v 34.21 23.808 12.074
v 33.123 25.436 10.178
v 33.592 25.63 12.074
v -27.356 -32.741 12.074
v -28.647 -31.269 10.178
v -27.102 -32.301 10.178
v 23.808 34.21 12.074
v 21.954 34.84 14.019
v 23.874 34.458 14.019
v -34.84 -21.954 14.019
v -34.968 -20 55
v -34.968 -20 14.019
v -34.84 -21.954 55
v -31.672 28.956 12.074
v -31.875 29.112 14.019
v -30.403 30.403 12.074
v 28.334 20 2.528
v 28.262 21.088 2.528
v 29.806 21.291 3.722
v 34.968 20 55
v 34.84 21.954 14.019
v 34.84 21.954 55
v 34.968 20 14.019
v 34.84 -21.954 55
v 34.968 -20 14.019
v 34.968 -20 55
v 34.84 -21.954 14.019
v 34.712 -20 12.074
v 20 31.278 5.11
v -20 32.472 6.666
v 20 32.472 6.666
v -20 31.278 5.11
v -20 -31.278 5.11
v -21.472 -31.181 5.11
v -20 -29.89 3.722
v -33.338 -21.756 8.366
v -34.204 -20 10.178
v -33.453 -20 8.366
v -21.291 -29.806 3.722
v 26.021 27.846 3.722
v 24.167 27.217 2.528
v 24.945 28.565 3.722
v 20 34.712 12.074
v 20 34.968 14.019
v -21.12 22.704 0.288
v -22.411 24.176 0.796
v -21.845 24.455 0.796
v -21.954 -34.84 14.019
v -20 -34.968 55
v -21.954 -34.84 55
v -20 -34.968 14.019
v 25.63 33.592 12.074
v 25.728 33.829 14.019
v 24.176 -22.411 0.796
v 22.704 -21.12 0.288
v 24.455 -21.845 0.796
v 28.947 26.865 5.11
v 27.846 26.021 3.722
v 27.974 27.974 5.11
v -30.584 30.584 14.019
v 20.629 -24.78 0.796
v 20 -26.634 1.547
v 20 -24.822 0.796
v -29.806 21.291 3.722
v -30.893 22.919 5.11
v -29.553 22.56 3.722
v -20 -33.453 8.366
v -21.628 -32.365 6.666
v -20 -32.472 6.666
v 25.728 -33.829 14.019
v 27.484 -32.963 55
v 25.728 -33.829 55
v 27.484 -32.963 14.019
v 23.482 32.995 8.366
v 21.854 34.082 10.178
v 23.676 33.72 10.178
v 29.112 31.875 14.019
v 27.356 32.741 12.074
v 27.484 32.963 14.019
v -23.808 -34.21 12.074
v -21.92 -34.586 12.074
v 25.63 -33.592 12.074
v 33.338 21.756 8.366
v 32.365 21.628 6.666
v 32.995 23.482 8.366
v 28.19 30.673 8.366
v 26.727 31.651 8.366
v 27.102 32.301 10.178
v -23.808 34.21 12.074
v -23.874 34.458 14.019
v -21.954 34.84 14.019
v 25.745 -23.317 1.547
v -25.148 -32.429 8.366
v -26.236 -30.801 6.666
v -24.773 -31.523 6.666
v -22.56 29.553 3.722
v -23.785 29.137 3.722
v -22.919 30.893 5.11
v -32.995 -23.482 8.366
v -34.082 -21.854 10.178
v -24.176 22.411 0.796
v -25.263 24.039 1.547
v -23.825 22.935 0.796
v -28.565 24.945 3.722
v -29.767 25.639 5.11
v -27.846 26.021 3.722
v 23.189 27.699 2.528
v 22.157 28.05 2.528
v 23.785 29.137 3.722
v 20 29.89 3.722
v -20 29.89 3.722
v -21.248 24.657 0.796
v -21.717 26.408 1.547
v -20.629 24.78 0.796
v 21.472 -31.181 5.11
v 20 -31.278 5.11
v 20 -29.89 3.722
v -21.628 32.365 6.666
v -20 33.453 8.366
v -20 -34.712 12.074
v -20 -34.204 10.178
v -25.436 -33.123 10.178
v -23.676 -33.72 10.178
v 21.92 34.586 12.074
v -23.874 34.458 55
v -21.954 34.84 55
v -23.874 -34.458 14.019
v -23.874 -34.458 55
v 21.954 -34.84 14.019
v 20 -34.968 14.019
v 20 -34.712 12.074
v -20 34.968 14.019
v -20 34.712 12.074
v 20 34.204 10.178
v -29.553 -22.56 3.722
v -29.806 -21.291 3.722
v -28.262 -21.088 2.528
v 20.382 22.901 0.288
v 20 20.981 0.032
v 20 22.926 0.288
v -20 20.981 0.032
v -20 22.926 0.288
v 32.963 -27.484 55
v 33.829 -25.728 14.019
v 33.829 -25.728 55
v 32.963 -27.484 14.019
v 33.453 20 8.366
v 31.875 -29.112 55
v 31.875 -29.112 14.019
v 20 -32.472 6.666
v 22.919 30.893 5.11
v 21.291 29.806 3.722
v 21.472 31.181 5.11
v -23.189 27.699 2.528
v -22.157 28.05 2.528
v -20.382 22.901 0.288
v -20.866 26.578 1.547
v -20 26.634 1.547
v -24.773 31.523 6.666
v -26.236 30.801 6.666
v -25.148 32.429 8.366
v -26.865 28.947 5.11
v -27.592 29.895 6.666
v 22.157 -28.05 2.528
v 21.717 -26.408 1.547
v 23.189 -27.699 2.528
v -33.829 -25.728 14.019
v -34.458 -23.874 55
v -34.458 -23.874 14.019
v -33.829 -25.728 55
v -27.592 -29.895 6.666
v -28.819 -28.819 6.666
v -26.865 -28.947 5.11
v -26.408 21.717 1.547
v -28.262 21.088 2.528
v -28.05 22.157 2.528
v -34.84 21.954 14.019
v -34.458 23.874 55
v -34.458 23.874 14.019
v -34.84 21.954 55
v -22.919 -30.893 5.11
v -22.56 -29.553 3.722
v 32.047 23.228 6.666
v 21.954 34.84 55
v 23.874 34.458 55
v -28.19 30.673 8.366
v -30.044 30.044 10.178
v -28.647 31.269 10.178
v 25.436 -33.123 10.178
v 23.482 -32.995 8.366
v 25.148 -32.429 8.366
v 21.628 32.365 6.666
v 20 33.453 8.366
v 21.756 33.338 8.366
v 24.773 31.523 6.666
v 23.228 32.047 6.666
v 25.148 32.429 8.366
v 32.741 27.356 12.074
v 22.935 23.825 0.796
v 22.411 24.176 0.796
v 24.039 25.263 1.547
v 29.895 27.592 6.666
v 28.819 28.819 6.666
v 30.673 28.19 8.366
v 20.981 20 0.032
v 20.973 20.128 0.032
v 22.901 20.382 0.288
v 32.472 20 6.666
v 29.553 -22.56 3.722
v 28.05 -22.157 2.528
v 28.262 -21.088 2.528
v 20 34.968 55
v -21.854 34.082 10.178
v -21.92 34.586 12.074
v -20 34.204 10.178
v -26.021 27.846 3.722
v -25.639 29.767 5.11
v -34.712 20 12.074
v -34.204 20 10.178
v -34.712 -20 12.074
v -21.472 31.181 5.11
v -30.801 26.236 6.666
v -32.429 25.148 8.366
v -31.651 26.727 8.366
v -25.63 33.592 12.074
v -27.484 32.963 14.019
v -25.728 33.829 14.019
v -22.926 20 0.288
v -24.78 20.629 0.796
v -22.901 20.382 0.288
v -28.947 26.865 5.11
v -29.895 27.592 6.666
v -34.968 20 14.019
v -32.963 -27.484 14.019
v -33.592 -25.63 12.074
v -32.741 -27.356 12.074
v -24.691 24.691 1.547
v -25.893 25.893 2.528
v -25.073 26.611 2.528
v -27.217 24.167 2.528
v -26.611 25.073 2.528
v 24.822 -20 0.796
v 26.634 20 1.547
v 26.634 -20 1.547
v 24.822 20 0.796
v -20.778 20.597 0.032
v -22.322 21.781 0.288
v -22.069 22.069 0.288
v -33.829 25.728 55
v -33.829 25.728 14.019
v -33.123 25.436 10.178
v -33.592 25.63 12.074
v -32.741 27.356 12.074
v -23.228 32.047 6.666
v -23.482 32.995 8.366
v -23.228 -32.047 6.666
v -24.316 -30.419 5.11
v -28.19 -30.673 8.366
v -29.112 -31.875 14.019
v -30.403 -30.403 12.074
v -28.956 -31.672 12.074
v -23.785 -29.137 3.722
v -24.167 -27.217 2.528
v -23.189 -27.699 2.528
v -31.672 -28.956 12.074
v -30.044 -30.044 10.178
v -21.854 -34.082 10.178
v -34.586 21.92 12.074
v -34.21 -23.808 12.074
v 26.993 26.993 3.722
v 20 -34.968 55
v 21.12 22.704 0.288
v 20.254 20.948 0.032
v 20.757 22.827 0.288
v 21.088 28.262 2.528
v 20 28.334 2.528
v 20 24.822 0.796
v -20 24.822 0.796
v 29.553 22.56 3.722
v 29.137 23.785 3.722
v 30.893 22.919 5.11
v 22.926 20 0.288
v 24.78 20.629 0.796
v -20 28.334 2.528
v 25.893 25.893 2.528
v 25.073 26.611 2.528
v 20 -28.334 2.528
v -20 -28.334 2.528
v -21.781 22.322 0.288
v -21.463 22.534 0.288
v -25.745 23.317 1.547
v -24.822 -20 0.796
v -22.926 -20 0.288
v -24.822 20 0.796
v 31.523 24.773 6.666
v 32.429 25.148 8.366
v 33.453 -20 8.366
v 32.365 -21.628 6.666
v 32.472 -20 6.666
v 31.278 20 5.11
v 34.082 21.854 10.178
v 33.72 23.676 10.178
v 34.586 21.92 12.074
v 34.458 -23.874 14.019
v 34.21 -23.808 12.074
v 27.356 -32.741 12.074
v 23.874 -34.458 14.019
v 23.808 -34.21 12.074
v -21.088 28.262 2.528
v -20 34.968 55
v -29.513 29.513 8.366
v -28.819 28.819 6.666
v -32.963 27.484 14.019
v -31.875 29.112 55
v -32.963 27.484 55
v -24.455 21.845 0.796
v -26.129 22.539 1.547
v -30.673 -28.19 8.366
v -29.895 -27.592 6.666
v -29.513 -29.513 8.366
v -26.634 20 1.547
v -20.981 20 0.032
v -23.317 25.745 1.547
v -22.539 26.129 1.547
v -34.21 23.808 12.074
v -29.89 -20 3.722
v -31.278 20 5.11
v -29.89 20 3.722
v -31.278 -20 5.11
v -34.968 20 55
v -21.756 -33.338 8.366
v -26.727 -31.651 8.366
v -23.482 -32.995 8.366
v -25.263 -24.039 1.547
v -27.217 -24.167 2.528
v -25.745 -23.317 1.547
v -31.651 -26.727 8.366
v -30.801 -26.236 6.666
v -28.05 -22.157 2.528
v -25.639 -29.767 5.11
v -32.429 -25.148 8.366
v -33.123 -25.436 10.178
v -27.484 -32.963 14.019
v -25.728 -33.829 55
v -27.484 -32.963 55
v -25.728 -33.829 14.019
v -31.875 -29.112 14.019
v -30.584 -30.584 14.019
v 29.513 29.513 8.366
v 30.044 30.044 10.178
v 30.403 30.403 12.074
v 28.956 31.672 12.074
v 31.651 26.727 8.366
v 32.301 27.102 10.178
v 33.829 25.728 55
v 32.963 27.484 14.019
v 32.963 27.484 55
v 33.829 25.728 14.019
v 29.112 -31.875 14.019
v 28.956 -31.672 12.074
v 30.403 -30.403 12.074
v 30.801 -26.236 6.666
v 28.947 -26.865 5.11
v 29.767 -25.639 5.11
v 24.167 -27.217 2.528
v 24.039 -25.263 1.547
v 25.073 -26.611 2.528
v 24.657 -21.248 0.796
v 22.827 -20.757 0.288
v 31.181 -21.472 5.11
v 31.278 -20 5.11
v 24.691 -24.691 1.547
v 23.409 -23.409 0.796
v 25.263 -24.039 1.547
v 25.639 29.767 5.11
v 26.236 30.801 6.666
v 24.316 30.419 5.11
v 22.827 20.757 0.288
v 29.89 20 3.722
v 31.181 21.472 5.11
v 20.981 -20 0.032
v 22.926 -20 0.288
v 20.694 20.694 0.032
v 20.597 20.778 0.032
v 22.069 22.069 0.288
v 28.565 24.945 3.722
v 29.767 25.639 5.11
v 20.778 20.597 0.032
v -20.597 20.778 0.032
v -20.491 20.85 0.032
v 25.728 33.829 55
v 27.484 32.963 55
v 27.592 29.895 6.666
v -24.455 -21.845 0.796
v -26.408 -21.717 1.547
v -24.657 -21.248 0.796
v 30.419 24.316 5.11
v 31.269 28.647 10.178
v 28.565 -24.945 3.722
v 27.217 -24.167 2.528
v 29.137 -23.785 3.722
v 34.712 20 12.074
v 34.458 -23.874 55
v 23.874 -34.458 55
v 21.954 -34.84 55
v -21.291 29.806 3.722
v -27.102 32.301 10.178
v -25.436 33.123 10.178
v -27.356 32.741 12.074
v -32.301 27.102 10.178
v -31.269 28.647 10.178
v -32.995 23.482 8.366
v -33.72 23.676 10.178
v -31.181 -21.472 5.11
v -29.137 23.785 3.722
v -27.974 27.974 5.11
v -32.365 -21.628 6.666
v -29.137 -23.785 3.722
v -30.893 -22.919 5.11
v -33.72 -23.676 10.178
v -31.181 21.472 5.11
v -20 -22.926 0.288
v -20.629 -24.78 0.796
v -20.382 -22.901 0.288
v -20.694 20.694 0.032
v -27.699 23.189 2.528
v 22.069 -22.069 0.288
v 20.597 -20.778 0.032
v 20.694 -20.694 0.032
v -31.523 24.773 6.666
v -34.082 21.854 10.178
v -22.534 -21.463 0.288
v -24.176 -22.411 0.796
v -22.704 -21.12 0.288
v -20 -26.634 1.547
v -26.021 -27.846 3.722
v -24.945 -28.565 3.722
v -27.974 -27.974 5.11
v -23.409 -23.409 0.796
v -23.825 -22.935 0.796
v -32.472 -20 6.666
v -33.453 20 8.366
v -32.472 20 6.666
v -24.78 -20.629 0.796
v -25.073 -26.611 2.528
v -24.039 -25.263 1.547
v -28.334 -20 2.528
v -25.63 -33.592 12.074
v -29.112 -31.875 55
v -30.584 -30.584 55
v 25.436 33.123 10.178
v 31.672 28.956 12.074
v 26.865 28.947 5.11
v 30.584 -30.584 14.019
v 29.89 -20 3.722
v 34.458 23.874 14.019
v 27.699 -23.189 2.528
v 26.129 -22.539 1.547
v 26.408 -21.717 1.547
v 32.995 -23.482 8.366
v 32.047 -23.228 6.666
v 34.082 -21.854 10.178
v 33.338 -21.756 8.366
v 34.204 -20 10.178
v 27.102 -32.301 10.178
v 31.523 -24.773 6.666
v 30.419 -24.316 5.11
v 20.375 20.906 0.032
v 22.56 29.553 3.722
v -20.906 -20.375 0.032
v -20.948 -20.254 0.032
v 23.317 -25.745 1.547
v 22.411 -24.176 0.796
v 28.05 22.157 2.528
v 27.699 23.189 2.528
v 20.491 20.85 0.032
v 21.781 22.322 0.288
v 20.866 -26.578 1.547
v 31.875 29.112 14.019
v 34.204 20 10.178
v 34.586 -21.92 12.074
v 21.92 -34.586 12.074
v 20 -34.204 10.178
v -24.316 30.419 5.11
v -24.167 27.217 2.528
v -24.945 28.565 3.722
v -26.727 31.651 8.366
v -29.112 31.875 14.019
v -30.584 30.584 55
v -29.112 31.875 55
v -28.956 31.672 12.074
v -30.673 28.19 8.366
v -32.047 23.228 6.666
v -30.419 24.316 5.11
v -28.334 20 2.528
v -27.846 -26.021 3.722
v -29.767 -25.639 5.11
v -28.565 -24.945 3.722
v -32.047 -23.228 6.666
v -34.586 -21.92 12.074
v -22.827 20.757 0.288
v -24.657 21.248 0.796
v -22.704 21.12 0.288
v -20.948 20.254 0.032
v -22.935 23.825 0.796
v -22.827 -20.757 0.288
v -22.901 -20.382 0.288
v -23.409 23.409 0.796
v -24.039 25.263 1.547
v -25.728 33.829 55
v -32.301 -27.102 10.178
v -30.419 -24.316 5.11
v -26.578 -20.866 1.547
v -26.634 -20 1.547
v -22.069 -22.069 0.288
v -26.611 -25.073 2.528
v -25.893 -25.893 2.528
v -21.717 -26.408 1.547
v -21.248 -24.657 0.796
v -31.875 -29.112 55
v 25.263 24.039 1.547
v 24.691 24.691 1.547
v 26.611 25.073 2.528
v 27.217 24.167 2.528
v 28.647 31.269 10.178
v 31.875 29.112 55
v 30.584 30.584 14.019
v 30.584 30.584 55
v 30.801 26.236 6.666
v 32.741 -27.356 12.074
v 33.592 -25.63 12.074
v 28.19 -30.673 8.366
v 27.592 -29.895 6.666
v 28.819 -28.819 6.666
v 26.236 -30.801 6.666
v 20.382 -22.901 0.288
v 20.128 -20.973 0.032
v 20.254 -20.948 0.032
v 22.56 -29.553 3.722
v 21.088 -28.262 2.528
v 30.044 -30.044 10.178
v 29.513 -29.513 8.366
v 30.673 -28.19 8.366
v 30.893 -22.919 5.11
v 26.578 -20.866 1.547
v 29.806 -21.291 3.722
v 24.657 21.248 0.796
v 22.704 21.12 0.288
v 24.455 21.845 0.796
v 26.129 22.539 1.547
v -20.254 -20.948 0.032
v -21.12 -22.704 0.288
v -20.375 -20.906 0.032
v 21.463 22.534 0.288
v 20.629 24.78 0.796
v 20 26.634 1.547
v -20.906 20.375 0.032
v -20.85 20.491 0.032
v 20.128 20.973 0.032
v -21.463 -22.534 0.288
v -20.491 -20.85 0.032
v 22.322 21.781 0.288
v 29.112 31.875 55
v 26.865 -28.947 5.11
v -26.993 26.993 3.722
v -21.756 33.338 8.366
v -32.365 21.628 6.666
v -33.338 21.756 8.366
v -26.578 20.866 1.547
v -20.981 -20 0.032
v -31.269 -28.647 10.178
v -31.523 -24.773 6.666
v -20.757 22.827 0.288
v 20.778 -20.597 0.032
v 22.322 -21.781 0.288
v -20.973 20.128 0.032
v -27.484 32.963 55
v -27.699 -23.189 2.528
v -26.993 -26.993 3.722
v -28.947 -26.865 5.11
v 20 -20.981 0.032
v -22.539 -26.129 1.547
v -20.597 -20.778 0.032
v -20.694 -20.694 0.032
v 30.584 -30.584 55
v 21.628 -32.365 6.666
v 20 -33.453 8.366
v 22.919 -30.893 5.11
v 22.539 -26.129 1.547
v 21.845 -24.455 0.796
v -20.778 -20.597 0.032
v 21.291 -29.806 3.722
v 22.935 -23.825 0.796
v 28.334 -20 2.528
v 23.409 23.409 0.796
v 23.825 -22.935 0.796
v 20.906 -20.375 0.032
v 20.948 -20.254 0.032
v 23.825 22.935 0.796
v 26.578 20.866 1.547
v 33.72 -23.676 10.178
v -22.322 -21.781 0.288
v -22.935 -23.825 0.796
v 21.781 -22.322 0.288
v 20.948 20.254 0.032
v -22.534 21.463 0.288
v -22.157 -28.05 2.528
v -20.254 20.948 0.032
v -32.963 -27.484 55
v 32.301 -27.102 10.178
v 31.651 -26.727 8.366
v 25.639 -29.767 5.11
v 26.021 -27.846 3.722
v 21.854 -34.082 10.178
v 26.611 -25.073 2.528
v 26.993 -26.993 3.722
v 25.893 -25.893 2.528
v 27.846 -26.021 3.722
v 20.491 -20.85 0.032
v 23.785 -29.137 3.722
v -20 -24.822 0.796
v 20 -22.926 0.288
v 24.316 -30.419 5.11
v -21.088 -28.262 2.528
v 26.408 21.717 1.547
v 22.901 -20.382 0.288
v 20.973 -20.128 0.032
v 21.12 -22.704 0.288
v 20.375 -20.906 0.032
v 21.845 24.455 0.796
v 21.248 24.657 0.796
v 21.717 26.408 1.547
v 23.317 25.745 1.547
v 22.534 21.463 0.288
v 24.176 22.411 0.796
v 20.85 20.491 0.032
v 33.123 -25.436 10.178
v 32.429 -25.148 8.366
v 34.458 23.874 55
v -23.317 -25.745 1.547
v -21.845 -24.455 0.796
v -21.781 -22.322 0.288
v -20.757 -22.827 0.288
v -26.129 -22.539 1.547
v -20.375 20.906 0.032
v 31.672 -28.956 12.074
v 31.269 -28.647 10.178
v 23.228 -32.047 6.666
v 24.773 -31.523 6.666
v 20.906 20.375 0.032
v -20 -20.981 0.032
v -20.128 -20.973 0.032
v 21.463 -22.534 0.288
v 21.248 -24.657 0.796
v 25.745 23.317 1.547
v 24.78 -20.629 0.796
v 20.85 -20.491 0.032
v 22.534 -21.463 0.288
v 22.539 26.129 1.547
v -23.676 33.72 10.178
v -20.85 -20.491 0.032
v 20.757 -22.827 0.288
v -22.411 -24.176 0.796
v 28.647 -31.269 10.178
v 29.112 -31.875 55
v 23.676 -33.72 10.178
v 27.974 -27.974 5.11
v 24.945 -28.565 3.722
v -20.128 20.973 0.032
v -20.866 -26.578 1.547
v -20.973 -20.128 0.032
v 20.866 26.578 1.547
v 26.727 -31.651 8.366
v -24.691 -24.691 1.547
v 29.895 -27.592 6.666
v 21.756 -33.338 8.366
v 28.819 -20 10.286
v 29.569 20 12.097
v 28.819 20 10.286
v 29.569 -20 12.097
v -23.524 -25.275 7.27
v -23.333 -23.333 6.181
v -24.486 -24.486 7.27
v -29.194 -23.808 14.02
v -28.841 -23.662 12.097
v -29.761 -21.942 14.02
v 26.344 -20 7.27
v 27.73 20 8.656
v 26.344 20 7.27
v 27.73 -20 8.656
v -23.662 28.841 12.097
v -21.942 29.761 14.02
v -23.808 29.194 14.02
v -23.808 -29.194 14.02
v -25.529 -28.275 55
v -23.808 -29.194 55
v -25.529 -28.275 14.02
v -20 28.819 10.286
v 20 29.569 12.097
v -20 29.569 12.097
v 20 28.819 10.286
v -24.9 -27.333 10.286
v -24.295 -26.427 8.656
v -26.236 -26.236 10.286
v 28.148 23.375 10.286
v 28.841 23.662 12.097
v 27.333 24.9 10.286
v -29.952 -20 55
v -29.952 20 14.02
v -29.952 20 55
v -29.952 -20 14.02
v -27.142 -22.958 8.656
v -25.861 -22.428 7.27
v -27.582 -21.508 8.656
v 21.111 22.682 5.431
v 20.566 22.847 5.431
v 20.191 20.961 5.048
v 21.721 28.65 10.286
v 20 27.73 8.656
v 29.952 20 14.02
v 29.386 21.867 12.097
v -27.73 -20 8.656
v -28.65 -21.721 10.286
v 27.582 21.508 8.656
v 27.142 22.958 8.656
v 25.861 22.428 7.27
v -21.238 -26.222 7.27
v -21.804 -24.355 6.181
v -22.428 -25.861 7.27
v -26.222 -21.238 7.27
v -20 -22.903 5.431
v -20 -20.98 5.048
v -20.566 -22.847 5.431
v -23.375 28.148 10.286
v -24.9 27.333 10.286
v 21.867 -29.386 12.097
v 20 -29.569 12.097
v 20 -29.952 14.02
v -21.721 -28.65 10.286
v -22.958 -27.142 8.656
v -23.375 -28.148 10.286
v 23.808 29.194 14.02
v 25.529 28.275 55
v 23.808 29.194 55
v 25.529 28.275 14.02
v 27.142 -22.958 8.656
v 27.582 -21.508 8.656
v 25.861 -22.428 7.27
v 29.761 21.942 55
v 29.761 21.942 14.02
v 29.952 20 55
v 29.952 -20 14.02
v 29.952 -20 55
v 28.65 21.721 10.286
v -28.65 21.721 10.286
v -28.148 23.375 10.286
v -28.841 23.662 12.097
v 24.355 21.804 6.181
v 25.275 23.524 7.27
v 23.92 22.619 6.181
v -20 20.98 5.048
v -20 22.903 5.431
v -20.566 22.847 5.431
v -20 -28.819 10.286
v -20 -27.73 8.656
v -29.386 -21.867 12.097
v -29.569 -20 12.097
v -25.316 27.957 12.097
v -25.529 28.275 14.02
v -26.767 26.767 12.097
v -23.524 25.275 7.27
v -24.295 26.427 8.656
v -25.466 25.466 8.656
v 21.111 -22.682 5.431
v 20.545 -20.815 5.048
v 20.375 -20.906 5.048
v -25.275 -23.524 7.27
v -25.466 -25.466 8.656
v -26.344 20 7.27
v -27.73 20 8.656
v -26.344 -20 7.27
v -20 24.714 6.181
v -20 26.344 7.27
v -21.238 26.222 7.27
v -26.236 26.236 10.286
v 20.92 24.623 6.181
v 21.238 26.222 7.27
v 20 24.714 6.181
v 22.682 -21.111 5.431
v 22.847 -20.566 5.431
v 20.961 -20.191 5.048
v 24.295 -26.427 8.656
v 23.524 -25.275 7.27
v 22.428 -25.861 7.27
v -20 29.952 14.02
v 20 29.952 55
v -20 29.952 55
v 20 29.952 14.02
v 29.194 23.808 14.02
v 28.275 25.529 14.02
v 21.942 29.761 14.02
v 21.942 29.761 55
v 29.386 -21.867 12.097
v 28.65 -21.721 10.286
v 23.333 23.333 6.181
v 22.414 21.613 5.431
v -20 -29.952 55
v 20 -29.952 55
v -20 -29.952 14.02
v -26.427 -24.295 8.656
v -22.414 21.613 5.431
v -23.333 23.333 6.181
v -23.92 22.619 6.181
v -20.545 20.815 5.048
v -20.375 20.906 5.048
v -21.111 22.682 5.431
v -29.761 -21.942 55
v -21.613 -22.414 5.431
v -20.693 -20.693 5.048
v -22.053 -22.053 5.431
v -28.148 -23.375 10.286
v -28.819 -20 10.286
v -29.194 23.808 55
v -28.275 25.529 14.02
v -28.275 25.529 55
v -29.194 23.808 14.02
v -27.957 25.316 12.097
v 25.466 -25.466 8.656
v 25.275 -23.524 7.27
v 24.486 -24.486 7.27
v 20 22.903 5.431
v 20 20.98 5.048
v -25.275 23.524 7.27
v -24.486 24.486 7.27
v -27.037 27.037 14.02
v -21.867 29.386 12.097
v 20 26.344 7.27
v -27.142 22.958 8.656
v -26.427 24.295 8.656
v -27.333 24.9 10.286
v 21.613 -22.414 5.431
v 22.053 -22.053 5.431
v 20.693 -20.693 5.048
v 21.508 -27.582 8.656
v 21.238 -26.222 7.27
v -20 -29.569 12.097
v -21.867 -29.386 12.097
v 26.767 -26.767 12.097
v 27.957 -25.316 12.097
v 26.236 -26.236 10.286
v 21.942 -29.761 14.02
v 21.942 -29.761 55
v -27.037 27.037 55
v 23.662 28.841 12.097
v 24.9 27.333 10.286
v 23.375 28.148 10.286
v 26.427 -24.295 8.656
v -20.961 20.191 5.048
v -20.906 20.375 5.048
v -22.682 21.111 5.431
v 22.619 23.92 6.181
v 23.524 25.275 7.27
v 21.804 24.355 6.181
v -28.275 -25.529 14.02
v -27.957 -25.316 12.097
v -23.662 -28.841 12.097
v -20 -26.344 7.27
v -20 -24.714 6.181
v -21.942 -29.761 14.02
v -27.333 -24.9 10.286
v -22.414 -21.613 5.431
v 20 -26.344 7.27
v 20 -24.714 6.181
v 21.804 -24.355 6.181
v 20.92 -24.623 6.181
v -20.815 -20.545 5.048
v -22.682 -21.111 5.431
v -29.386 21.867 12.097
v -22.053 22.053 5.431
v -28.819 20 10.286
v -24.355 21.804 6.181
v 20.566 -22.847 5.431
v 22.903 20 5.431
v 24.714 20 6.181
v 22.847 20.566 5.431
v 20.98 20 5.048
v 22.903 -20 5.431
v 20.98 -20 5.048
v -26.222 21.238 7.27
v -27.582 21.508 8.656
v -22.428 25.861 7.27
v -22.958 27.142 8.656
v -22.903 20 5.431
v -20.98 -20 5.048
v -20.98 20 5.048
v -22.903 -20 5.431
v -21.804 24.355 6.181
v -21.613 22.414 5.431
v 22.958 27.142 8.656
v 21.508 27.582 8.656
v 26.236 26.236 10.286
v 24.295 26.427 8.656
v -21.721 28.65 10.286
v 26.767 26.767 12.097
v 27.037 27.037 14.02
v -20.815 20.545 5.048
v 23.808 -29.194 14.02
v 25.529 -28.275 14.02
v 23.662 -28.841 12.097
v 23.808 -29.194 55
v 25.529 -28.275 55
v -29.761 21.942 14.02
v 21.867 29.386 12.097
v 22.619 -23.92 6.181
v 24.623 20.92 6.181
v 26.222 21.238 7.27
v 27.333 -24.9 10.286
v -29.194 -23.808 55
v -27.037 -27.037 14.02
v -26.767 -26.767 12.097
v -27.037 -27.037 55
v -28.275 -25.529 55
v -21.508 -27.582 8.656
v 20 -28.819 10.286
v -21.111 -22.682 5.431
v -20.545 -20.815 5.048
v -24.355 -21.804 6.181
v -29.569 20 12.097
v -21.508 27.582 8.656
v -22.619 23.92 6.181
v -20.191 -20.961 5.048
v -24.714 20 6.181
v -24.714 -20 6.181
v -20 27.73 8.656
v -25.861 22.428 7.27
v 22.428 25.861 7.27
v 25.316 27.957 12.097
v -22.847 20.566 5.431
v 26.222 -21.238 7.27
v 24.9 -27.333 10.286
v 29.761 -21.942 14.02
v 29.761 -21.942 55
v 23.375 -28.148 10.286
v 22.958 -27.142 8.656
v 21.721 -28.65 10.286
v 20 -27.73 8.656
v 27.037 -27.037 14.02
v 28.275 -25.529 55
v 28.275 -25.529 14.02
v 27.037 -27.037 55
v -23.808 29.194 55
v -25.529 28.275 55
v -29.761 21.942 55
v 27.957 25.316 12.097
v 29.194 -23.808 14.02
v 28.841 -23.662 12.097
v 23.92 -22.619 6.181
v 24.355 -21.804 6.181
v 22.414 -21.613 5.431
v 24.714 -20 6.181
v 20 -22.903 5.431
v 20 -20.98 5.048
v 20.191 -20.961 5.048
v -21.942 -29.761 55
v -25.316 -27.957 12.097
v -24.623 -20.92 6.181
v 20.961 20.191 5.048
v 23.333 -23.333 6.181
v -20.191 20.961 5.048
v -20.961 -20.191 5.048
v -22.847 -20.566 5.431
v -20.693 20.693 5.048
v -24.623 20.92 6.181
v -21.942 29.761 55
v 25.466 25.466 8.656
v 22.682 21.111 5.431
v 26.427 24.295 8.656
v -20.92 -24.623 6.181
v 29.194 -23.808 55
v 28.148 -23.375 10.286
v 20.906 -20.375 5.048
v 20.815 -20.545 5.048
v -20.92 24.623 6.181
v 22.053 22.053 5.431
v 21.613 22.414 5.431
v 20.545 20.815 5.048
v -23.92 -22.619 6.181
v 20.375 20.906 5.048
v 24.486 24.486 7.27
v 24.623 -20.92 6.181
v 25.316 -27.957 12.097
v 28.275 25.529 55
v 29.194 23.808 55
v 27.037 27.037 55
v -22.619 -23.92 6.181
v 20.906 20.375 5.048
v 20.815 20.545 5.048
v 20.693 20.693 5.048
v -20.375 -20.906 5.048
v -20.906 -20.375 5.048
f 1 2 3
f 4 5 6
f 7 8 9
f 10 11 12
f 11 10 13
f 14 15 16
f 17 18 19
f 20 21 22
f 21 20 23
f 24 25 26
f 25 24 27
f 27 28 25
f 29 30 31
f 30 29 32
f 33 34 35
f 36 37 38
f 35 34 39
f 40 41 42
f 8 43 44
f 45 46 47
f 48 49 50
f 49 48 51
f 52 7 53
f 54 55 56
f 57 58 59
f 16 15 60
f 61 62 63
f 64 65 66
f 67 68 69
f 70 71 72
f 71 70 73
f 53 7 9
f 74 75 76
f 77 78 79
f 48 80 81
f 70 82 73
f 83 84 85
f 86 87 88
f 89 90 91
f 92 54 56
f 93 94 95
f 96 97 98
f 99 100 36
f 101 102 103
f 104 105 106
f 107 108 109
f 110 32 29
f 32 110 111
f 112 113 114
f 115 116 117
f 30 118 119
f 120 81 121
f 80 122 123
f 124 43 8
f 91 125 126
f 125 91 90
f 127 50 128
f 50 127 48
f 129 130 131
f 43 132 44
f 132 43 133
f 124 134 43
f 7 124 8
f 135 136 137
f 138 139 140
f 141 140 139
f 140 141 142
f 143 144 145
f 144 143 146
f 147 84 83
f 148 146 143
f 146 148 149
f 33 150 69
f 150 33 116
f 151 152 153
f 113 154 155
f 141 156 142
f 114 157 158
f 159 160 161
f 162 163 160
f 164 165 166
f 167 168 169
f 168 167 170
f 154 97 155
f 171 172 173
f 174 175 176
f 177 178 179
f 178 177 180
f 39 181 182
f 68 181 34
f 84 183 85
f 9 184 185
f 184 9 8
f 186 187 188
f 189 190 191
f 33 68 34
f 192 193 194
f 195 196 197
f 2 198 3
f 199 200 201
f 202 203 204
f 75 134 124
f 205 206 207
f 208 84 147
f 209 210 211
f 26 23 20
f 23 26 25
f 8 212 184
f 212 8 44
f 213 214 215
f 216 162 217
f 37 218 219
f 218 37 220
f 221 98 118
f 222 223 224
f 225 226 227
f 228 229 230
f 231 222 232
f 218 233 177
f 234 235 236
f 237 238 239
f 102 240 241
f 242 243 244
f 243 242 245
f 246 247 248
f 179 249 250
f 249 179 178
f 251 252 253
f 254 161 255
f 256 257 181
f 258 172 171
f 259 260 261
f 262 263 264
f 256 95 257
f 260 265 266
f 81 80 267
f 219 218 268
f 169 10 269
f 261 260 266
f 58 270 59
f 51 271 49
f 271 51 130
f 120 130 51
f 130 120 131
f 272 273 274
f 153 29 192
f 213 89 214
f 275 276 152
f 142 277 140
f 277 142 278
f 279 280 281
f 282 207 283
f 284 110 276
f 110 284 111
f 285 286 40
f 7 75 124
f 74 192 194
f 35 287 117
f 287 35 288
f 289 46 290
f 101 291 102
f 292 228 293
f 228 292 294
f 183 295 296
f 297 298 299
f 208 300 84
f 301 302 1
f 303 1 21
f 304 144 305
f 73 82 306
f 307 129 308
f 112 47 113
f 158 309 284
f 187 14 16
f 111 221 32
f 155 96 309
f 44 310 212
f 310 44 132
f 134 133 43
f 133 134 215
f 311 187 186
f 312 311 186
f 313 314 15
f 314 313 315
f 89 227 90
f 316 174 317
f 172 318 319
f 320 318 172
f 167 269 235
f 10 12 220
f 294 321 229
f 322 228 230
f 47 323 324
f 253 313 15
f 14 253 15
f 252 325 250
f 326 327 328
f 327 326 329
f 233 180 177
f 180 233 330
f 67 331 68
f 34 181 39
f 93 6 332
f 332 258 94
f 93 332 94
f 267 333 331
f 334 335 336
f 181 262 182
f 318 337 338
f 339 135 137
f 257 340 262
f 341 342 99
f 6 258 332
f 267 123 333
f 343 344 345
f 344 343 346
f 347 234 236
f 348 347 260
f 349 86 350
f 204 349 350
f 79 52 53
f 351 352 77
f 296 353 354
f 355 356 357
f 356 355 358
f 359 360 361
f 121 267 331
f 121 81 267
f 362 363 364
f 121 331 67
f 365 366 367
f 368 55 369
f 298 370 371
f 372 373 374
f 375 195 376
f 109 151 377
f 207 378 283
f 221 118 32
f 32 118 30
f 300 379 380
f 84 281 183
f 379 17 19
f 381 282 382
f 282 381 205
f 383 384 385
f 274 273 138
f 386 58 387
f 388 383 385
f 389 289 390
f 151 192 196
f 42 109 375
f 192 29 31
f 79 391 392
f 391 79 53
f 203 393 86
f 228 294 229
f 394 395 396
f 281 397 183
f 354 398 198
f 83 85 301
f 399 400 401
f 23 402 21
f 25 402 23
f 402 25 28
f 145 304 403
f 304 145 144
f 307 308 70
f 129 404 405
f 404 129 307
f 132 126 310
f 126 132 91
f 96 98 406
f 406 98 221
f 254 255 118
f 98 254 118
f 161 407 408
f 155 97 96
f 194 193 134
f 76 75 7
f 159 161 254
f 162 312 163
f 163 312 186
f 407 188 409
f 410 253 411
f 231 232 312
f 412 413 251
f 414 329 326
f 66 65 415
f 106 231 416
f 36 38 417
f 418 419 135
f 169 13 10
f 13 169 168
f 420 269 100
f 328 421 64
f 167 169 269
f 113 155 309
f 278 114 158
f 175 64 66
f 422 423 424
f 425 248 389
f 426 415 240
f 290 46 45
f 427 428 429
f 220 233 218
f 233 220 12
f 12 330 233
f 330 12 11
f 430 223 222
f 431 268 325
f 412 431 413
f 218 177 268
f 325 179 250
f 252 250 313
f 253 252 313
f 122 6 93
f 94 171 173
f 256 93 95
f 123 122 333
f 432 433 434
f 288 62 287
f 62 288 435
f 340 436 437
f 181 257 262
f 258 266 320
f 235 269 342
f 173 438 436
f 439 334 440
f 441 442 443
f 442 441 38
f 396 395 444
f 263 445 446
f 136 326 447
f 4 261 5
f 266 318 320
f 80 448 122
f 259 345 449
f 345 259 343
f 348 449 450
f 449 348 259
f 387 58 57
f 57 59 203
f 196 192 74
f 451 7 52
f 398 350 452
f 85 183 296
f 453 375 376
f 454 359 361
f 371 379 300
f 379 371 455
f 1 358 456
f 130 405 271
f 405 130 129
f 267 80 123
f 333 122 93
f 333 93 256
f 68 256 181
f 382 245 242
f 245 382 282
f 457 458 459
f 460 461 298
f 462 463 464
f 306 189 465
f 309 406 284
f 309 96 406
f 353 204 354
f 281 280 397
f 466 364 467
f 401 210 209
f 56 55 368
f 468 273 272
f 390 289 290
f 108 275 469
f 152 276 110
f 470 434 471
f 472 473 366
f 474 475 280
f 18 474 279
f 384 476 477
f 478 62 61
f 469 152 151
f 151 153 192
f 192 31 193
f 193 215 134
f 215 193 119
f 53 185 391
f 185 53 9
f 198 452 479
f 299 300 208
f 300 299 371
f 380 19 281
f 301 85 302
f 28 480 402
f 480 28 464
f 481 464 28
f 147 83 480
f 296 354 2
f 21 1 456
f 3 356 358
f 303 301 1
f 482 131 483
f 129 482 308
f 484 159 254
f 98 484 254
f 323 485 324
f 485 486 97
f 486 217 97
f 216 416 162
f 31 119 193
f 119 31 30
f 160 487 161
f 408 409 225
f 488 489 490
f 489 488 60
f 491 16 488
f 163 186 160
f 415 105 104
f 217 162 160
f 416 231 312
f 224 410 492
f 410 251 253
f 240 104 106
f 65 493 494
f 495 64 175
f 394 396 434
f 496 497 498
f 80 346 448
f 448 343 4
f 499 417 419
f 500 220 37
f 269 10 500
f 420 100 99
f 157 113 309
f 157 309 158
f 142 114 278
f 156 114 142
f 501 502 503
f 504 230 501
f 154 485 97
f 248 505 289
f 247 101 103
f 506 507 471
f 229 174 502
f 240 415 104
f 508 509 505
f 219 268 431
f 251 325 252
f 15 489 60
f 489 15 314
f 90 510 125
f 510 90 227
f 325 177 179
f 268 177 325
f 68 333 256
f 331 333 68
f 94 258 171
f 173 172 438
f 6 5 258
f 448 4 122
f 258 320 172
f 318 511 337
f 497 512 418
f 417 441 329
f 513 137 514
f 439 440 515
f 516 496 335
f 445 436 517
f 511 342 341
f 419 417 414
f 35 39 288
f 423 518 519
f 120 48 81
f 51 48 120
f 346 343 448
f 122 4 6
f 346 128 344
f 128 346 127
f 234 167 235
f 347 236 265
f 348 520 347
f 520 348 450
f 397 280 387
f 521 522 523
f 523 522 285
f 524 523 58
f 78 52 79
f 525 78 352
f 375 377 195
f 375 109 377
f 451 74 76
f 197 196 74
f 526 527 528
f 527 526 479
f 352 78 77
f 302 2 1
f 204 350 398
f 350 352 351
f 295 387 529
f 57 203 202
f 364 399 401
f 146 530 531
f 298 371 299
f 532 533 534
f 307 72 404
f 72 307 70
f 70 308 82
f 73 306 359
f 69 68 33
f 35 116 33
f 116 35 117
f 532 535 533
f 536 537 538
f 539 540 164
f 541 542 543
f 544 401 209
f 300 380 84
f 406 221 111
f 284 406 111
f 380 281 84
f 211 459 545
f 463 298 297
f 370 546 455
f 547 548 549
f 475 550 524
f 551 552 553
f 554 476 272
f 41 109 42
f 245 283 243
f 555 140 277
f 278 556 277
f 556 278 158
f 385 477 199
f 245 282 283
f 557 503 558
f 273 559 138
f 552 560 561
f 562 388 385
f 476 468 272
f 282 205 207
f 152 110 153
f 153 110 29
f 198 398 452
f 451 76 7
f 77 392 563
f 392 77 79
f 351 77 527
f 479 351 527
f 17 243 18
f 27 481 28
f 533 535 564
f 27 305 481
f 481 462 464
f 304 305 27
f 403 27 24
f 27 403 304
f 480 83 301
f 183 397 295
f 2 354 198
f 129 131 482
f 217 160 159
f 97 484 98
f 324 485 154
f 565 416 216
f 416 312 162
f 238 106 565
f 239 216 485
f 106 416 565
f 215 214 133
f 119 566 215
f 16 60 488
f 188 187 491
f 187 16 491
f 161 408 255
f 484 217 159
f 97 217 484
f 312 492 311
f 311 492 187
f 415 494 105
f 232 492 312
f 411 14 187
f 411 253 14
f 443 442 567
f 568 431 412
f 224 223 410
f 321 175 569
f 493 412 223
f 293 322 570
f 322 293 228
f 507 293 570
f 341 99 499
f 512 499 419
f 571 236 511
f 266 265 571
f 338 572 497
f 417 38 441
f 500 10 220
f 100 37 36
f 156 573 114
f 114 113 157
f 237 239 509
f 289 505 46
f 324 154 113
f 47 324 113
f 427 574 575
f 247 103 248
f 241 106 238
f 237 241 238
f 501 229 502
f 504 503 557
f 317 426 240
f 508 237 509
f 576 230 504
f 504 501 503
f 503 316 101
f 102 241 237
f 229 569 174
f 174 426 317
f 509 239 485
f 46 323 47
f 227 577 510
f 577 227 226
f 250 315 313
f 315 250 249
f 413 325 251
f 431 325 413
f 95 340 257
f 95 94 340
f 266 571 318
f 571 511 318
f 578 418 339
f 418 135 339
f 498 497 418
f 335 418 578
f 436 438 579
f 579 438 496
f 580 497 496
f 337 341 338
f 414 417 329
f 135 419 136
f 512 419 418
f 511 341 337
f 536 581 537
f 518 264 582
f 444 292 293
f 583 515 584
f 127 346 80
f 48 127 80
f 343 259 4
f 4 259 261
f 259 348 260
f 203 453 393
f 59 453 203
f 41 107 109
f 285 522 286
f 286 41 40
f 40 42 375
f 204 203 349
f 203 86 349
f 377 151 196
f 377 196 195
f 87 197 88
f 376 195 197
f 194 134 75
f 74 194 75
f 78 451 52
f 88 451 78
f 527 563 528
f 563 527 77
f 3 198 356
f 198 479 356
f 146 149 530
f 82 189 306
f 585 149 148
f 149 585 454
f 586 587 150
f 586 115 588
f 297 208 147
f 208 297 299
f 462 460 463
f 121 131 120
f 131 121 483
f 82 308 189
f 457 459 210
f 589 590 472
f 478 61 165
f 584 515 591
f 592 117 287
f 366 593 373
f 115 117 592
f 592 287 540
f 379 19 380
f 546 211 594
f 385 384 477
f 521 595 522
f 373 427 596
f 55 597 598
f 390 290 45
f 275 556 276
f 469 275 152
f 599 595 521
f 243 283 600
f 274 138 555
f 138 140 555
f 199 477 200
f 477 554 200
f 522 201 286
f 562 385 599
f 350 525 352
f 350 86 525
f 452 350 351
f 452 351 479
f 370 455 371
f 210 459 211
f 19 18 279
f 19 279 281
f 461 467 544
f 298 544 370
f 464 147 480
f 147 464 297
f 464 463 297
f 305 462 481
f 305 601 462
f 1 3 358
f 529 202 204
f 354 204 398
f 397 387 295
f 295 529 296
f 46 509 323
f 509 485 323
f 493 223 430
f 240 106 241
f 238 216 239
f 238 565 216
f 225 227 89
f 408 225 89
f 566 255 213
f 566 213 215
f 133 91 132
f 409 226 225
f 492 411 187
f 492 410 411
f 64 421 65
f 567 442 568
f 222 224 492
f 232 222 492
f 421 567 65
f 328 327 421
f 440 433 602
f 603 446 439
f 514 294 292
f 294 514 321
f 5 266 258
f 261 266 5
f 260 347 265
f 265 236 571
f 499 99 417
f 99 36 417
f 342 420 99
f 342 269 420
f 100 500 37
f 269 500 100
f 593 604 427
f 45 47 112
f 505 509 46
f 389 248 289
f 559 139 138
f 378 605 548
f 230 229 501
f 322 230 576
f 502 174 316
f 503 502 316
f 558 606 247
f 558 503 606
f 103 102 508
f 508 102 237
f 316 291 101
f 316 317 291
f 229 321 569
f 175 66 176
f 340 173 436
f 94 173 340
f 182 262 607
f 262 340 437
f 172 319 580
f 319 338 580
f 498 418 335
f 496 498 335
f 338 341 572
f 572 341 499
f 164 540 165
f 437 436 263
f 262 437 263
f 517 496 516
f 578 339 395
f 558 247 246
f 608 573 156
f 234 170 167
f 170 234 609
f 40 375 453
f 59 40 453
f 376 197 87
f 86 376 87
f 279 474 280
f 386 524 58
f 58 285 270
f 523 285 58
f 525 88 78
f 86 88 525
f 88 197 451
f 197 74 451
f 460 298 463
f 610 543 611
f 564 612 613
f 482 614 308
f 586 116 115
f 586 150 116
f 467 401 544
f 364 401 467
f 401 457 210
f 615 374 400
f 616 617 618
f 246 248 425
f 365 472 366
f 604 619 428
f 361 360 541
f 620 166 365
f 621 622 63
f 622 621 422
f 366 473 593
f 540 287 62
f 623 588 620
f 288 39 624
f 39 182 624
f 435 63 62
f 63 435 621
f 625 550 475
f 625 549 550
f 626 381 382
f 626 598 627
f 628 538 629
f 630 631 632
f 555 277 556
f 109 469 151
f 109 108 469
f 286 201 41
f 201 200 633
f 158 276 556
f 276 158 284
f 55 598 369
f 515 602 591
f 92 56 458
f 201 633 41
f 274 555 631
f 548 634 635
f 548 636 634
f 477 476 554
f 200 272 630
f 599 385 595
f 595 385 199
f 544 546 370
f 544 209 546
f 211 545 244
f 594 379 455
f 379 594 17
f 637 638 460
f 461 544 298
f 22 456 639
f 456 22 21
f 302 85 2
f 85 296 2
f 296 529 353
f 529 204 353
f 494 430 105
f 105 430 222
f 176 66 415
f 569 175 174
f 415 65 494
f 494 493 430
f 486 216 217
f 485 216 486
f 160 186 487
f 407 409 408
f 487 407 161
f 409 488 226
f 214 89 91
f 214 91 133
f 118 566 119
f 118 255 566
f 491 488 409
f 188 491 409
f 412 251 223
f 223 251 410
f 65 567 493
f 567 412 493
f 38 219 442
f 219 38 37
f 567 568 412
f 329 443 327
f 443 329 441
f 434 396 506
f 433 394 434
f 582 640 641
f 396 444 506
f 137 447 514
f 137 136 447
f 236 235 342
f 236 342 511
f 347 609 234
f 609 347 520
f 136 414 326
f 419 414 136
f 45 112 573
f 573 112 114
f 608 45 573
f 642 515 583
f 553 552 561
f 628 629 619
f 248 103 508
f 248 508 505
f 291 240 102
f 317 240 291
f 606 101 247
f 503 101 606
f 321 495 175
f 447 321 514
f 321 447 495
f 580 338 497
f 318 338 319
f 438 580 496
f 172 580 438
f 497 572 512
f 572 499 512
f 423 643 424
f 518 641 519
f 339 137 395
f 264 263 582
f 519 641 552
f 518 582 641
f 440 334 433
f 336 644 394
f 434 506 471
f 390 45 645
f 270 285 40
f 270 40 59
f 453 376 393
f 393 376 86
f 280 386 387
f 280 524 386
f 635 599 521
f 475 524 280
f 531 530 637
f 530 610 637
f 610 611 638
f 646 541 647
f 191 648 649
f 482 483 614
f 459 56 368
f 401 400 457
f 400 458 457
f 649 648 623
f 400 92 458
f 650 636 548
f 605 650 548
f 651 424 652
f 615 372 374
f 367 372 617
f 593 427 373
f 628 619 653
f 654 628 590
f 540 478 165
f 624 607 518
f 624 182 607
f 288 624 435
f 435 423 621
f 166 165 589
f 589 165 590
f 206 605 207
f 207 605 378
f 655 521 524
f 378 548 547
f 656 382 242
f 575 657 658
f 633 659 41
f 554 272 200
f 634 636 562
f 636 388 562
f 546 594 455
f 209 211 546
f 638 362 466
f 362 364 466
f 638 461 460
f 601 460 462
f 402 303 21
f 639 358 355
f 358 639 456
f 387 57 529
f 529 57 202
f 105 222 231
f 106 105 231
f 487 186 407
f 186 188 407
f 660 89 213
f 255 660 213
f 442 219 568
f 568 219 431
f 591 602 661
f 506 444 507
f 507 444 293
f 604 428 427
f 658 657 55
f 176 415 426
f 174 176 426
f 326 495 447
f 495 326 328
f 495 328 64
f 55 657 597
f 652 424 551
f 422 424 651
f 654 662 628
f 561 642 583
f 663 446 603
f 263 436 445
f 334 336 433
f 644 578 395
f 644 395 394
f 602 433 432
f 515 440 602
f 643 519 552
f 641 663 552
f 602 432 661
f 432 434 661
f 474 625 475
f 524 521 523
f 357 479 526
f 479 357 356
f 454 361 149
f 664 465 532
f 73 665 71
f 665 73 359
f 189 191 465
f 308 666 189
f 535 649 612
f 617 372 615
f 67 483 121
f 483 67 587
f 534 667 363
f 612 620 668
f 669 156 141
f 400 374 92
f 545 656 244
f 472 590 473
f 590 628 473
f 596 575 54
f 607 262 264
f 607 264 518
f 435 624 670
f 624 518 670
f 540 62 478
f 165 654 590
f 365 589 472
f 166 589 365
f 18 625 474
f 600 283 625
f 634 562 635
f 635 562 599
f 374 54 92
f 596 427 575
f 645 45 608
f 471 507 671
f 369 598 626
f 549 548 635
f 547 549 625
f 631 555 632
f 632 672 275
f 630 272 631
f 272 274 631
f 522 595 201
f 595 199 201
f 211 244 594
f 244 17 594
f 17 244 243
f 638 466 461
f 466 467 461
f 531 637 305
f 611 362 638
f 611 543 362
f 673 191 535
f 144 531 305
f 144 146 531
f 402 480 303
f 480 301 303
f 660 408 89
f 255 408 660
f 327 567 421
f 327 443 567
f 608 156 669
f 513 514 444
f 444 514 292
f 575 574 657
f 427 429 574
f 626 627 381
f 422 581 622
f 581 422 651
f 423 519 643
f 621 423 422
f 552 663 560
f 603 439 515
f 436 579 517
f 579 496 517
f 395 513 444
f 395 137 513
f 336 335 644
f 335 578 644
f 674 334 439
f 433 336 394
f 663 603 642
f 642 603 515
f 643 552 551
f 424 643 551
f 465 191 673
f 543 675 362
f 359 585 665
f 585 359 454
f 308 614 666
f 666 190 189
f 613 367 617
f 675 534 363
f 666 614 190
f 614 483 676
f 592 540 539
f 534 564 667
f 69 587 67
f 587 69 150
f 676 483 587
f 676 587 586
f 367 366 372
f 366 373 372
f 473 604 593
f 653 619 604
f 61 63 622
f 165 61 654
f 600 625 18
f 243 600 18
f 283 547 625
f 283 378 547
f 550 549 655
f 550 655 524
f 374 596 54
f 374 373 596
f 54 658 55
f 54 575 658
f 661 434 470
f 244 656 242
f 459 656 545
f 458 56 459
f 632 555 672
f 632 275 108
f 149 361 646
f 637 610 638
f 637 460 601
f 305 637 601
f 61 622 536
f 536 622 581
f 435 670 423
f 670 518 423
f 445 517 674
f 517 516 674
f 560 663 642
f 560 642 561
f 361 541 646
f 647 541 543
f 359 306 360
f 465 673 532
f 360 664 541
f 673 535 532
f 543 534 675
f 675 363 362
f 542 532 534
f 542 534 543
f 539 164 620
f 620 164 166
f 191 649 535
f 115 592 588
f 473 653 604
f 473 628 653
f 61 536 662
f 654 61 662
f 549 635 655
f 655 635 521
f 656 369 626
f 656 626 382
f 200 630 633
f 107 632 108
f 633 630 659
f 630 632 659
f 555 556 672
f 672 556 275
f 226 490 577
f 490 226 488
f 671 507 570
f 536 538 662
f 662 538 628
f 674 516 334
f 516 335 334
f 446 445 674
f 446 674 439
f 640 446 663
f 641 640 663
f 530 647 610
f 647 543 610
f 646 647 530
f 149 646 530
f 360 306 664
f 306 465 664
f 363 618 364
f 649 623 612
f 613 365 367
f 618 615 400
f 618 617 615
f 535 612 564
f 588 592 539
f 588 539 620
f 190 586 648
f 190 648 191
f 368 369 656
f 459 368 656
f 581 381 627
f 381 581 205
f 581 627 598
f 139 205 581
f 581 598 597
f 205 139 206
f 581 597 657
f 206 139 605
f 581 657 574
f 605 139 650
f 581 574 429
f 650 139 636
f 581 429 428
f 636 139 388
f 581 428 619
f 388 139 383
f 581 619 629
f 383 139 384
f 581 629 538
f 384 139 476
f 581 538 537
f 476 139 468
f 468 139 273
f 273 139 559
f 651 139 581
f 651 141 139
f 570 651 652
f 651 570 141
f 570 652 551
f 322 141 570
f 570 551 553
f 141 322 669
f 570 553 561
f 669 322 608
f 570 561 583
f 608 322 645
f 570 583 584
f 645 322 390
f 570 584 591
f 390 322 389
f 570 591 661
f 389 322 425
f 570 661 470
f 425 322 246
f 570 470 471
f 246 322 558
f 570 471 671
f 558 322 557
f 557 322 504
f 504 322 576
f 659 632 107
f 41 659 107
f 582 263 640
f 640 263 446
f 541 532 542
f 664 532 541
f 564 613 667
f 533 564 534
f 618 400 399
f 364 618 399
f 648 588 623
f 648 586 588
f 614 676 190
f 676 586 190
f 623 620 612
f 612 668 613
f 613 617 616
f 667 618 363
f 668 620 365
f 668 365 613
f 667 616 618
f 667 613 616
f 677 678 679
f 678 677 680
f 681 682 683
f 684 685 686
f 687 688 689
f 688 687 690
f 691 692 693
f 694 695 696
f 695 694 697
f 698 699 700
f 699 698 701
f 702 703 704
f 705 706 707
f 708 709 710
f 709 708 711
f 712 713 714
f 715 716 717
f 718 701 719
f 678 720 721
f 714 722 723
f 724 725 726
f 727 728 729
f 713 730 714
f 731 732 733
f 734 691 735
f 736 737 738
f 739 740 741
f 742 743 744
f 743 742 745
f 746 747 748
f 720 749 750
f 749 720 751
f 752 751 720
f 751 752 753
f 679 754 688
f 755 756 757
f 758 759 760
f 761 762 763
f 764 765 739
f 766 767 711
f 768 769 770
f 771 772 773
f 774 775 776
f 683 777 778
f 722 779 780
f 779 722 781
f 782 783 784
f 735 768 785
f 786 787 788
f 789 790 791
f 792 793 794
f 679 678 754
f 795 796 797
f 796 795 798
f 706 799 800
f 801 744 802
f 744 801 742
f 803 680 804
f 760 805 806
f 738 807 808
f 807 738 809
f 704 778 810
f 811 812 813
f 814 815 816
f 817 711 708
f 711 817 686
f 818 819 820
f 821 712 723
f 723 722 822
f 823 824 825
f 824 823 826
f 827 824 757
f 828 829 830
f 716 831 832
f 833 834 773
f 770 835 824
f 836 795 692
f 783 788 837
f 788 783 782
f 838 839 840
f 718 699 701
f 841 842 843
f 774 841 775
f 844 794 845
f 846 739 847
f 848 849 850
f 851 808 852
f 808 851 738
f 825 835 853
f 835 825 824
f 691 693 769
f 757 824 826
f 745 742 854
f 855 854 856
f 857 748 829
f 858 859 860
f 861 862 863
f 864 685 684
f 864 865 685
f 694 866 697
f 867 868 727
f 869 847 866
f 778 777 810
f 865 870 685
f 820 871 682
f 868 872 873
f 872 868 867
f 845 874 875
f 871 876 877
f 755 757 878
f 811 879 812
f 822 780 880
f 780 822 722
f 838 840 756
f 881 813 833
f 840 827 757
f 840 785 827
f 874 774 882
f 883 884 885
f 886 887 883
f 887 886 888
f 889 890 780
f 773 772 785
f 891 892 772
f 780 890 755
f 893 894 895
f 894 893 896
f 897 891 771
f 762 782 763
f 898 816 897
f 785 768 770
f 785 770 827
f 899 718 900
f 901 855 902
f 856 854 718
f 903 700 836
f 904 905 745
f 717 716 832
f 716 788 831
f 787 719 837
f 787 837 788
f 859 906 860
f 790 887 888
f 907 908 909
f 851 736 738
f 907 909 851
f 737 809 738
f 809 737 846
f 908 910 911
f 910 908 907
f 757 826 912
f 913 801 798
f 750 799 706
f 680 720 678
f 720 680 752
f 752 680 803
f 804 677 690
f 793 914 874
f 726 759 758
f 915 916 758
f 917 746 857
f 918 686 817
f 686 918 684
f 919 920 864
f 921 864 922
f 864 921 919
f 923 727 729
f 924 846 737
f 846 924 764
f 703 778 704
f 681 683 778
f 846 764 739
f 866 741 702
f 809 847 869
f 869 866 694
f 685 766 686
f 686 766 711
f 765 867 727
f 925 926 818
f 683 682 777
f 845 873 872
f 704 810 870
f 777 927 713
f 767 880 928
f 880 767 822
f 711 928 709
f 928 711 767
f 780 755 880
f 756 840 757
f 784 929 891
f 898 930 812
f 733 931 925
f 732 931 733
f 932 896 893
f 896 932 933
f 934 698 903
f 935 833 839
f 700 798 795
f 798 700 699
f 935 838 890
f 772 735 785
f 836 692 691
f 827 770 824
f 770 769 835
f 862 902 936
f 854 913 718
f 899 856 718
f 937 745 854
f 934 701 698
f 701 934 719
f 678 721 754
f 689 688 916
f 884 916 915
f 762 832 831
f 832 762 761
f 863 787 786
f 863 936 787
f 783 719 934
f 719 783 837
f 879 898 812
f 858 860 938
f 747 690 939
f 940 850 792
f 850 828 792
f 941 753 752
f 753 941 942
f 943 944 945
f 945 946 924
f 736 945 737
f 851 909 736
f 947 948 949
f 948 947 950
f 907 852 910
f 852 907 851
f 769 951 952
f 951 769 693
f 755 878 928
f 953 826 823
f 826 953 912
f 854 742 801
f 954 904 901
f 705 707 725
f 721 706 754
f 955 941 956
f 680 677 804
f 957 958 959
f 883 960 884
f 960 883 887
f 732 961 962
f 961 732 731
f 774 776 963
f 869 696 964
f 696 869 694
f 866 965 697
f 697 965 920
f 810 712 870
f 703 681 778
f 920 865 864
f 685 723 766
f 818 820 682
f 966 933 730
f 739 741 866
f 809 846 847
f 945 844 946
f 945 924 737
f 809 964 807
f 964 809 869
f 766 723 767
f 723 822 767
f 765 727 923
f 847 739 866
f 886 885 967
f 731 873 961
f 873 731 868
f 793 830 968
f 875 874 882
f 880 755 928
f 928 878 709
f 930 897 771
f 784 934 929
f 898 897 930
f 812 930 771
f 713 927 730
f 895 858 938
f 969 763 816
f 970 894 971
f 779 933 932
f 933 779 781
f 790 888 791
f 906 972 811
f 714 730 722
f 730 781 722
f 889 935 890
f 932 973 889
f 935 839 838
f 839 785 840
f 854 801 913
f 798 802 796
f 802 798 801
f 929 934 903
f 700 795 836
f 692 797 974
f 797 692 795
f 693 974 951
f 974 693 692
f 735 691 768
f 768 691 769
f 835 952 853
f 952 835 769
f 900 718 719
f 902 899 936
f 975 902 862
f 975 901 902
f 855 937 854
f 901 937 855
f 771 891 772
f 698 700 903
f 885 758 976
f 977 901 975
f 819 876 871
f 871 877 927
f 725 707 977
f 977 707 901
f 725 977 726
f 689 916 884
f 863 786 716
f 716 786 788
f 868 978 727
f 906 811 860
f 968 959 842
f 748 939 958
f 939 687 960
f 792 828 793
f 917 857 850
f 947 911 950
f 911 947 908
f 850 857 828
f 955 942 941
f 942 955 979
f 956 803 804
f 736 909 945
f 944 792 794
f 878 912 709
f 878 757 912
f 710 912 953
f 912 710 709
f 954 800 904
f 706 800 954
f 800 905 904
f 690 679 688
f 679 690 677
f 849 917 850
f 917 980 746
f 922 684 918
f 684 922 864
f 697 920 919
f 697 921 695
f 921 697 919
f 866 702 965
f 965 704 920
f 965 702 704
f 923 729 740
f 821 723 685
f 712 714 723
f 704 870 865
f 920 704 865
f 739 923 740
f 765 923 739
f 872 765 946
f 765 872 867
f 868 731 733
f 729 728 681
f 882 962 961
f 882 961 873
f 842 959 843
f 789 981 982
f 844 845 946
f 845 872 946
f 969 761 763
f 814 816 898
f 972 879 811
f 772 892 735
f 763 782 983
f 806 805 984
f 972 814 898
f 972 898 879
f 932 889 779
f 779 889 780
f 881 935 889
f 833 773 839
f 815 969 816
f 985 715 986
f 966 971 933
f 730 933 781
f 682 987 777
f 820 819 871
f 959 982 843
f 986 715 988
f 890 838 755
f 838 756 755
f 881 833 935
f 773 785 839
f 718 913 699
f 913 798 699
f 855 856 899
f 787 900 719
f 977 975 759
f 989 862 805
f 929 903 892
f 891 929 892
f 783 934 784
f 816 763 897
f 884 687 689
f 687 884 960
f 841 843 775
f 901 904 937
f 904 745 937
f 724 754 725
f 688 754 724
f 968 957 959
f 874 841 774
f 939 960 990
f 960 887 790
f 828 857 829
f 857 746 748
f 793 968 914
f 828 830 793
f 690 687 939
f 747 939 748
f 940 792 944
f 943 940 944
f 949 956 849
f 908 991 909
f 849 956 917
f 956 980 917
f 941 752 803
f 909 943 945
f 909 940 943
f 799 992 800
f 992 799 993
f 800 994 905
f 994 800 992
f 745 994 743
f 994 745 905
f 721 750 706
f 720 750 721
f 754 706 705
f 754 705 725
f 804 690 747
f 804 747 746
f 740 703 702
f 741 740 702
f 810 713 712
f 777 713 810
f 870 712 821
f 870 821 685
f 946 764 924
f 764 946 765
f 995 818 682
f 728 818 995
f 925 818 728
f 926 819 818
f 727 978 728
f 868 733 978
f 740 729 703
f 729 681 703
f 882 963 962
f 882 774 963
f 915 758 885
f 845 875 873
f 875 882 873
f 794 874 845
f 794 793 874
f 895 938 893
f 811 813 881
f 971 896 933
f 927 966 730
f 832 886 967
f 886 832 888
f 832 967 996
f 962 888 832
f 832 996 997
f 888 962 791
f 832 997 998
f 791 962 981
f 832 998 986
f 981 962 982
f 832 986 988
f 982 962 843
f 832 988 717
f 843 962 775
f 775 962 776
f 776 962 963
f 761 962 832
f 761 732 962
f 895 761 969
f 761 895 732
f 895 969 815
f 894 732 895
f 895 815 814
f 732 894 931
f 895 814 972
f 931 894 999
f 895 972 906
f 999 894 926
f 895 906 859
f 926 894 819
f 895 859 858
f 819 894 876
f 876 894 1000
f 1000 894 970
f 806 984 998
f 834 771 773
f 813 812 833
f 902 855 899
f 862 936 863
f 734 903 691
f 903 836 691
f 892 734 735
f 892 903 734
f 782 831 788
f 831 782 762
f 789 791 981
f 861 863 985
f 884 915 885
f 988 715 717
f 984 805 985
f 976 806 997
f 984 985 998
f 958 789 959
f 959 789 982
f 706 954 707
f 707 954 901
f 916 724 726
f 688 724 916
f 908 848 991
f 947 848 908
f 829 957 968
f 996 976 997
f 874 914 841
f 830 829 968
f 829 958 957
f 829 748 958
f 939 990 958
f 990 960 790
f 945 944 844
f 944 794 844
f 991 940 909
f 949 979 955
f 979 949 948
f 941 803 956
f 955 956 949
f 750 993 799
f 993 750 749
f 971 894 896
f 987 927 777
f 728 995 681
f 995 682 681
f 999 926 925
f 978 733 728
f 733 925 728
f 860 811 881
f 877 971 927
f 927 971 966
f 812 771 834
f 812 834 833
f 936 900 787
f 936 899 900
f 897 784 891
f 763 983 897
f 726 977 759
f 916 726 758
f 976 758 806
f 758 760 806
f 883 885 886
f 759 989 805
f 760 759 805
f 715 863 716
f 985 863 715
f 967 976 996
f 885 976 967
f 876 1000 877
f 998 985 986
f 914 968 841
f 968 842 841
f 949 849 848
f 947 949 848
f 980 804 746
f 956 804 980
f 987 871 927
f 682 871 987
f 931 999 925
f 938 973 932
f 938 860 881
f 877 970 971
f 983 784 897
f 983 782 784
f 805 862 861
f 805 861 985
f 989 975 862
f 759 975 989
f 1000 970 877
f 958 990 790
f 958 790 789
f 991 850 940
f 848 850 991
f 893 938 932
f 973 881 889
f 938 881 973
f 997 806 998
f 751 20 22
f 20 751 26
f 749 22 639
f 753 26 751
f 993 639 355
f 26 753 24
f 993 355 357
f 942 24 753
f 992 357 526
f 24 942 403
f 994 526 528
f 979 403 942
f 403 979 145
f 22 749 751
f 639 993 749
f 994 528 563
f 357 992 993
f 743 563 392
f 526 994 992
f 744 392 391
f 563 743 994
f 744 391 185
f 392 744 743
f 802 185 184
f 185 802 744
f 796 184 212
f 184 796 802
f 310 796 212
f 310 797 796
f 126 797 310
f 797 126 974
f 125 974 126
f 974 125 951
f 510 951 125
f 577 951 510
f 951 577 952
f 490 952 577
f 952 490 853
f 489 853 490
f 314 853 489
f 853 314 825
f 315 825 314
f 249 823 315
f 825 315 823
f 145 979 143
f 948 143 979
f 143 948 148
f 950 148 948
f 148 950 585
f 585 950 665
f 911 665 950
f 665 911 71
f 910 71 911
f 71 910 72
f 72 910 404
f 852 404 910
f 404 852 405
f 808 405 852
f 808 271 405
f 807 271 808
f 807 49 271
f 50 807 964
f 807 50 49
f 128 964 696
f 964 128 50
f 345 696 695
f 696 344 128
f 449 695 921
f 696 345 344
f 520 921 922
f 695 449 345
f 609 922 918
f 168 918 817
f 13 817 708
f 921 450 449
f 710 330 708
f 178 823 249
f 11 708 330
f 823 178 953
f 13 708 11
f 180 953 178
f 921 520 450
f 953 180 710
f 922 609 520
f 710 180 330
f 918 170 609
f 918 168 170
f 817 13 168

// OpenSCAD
//Make a box or a lid:
type="box";//[box,lid]

//Outer height of box with lid:
height=70;//[20:150]
//Outer width of box:
width=70;//[20:150]
//Outer depth of box:
depth=70;//[20:200]

//curvature of sides:
roundness=15;//[5:30]
// How smooth the rounded corners are. 10 is standard, 5 is quite smooth.
$fa=5;//[1:20]

//How thick the walls are:
thickness=5;//[1:20]

//How much space is between lid inset and inside of box:
wiggle_room=1;//[0:3]
//How deep the lid inset is:
flange_height=2;//[0:10]



inner_radius=roundness-thickness;
if(type=="lid"){
translate([-width/2+roundness,-depth/2+roundness,0]){
difference(){
	translate([0,0,roundness]){
	minkowski(){
		cube([width-2*roundness,depth-2*roundness,70-2*roundness]);
		sphere(roundness);}
}
translate([-roundness-1,-roundness-1,roundness])
cube([width+2,depth+2,roundness+70+1]);}
translate([wiggle_room/2,wiggle_room/2,roundness]){
	linear_extrude(height=flange_height){
		minkowski(){
		square([width-2*(inner_radius+thickness)-wiggle_room,depth-2*(inner_radius+thickness)-wiggle_room]);
	circle(inner_radius);}
}}}}

if (type=="box"){
if (inner_radius>0){
translate([-width/2+roundness,-depth/2+roundness,0]){
difference(){
	translate([0,0,roundness]){
	difference(){
	minkowski(){
		cube([width-2*roundness,depth-2*roundness,height-2*roundness]);
		sphere(roundness);}
	minkowski(){
		cube([width-2*(inner_radius+thickness),depth-2*(inner_radius+thickness),height-2*(thickness)]);
		sphere(inner_radius);}
}}
translate([-roundness,-roundness,height-roundness])
cube([width,depth,roundness+1]);}}}}
